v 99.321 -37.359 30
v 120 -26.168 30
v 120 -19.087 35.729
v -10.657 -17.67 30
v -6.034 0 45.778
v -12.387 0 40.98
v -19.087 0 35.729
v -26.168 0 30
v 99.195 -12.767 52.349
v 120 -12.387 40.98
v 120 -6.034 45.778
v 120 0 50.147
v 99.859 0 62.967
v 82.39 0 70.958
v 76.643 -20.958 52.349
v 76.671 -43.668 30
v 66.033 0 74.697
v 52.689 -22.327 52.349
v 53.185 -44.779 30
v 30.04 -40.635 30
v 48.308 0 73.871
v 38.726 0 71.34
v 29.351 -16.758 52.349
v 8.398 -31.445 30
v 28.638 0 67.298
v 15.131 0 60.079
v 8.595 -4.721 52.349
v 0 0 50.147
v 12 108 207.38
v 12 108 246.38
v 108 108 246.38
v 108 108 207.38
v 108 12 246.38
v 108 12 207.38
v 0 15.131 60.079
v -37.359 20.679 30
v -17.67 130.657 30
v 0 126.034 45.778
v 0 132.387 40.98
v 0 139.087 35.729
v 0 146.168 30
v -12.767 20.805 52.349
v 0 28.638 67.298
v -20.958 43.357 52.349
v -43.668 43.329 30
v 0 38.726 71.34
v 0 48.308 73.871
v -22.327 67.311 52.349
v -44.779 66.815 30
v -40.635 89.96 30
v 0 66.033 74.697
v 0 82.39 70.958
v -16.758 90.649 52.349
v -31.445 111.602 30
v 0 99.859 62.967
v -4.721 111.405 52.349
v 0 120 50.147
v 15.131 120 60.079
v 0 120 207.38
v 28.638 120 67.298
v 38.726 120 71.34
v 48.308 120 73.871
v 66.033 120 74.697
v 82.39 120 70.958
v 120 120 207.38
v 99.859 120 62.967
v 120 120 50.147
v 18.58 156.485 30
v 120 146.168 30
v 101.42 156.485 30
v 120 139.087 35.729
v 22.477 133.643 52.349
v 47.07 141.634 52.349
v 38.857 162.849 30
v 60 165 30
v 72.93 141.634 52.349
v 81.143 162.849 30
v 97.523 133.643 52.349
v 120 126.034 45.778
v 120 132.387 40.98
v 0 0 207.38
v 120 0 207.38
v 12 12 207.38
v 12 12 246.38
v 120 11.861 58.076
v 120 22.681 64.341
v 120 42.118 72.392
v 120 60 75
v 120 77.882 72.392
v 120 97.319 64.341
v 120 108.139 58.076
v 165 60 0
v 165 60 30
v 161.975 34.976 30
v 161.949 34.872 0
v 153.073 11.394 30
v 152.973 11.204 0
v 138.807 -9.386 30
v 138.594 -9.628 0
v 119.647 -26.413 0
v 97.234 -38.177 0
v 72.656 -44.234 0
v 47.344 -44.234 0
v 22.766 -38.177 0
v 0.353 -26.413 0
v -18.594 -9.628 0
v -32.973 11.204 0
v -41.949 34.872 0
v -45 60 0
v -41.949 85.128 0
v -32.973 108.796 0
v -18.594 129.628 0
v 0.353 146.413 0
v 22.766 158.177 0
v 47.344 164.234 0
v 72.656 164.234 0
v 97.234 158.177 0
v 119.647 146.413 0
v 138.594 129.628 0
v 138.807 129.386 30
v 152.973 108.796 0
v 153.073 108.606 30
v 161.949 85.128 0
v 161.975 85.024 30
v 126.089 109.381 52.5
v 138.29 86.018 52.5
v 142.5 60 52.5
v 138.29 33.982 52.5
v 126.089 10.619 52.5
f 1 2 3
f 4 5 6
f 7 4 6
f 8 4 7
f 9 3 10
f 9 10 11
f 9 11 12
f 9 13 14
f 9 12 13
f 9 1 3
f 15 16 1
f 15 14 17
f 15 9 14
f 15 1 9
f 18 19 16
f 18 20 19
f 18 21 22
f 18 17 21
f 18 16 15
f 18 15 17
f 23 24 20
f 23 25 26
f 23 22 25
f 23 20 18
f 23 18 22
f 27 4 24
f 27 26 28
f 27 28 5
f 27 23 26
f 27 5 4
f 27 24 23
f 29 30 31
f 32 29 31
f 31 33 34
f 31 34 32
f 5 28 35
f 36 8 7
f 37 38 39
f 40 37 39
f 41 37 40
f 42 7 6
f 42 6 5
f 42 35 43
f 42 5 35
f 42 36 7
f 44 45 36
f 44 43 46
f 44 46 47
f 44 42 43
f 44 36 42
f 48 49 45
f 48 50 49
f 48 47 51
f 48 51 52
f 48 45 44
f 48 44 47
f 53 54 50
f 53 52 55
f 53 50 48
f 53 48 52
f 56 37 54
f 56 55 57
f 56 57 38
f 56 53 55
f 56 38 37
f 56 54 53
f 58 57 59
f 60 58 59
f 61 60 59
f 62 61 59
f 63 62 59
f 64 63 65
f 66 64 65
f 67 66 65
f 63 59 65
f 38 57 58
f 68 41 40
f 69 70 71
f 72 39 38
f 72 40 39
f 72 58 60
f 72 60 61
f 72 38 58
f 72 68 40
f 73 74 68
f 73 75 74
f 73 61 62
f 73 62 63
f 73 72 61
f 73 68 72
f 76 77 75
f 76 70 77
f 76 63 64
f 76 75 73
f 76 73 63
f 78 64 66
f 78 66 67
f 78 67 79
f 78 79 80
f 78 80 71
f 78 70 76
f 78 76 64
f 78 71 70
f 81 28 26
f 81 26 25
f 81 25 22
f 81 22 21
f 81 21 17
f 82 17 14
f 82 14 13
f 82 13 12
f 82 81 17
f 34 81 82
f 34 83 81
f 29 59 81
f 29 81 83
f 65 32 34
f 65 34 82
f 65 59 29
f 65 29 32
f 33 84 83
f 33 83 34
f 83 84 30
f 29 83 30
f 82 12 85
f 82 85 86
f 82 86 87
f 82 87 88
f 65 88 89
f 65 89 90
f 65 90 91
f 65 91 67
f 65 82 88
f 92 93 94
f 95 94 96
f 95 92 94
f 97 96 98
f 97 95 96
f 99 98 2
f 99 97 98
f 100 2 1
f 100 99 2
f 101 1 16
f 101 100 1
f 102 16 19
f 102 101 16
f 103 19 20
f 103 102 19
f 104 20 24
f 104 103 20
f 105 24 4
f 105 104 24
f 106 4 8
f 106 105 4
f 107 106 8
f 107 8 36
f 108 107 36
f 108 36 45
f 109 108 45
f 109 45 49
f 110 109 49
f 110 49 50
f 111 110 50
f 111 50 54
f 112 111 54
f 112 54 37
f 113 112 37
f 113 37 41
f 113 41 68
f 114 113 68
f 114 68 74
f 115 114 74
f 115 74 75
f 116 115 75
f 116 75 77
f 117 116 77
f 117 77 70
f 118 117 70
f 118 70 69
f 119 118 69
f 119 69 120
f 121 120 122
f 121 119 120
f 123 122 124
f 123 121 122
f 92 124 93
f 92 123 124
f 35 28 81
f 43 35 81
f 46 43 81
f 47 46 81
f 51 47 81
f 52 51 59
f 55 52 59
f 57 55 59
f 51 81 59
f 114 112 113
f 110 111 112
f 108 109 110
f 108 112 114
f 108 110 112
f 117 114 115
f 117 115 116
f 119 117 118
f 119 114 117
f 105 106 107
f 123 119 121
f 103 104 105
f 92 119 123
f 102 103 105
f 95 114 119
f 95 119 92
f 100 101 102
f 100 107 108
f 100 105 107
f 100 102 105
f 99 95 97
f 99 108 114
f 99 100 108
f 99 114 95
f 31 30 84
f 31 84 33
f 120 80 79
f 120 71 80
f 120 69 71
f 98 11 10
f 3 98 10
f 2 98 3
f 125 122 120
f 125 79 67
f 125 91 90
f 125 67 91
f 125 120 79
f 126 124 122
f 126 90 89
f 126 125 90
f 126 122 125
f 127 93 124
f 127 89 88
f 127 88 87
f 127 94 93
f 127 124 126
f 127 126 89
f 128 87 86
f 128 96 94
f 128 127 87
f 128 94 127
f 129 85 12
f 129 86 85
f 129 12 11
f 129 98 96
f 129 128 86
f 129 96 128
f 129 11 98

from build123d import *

# Parameters (mm, degrees)
F0_W     = 120
F0_H     = 120
F1_DEPTH = 246.38
F2_W     = 120
F2_H     = 120
F2_W_2   = 96
F2_H_2   = 96
F3_DEPTH = 39
F4_R     = 105
F4_W     = 120
F4_H     = 120
F5_DEPTH = 100
F7_DEPTH = 80


# Not quite as in the source:
# - a fillet or chamfer that OpenCascade refuses, or shapes differently, is made with other operations: its cross-section is extruded or revolved along the edge and cut away or added


with BuildPart() as f1:
    # F0 (on Top) → F1 (new body)
    with BuildSketch(Plane.XY):
        with Locations((60, 60)):
            Rectangle(F0_W, F0_H)
    extrude(amount=F1_DEPTH)

    # F2 (on face) → F3 (cut)
    with BuildSketch(Plane.XY.offset(246.38)):
        with Locations((60, 60)):
            Rectangle(F2_W, F2_H)
        with Locations((60, 60)):
            Rectangle(F2_W_2, F2_H_2, mode=Mode.SUBTRACT)
    extrude(amount=-F3_DEPTH, mode=Mode.SUBTRACT)

    # F4 (on face) → F5 (join)
    with BuildSketch(Plane(origin=(0, 0, 0), x_dir=(1, 0, 0), z_dir=(0, 0, -1))):
        with Locations((60, -60)):
            Circle(F4_R)
        with Locations((60, -60)):
            Rectangle(F4_W, F4_H, mode=Mode.SUBTRACT)
    extrude(amount=-F5_DEPTH)

    # F6: chamfer of 70 on 1 edges, made by hand


with BuildPart() as f6_tool2:
    # F6_s3 → F6_t4 (revolve)
    with BuildSketch(Plane.XZ.offset(-60)):
        Polygon((95, 100), (165, 30), (165, 100), align=None)
    revolve(axis=Axis((60, 60, 100), (0, 0, -1)))

    split(bisect_by=Plane.YZ.offset(120), keep=Keep.TOP)


with BuildPart() as f1_1:
    add(f1.part)

    # F6_t1: cut F6_tool2
    add(f6_tool2.part, mode=Mode.SUBTRACT)


with BuildPart() as f6_tool7:
    # F6_s8 → F6_t9 (revolve)
    with BuildSketch(Plane.XZ.offset(-60)):
        Polygon((95, 100), (165, 30), (165, 100), align=None)
    revolve(axis=Axis((60, 60, 100), (0, 0, -1)))

    split(bisect_by=Plane.XZ, keep=Keep.TOP)


with BuildPart() as f1_2:
    add(f1_1.part)

    # F6_t6: cut F6_tool7
    add(f6_tool7.part, mode=Mode.SUBTRACT)


with BuildPart() as f6_tool12:
    # F6_s13 → F6_t14 (revolve)
    with BuildSketch(Plane.XZ.offset(-60)):
        Polygon((95, 100), (165, 30), (165, 100), align=None)
    revolve(axis=Axis((60, 60, 100), (0, 0, -1)))

    split(bisect_by=Plane.YZ, keep=Keep.BOTTOM)


with BuildPart() as f1_3:
    add(f1_2.part)

    # F6_t11: cut F6_tool12
    add(f6_tool12.part, mode=Mode.SUBTRACT)


with BuildPart() as f6_tool17:
    # F6_s18 → F6_t19 (revolve)
    with BuildSketch(Plane.XZ.offset(-60)):
        Polygon((95, 100), (165, 30), (165, 100), align=None)
    revolve(axis=Axis((60, 60, 100), (0, 0, -1)))

    split(bisect_by=Plane.XZ.offset(-120), keep=Keep.BOTTOM)


with BuildPart() as f1_4:
    add(f1_3.part)

    # F6_t16: cut F6_tool17
    add(f6_tool17.part, mode=Mode.SUBTRACT)


with BuildPart() as f7:
    # F7 (new): a face of the model
    f7_faces = [f1_4.part.faces().sort_by_distance(p)[0] for p in [
        (60, 118.3029437252, 207.38),
    ]]
    extrude(f7_faces, amount=F7_DEPTH)


solid = f1_4.part
